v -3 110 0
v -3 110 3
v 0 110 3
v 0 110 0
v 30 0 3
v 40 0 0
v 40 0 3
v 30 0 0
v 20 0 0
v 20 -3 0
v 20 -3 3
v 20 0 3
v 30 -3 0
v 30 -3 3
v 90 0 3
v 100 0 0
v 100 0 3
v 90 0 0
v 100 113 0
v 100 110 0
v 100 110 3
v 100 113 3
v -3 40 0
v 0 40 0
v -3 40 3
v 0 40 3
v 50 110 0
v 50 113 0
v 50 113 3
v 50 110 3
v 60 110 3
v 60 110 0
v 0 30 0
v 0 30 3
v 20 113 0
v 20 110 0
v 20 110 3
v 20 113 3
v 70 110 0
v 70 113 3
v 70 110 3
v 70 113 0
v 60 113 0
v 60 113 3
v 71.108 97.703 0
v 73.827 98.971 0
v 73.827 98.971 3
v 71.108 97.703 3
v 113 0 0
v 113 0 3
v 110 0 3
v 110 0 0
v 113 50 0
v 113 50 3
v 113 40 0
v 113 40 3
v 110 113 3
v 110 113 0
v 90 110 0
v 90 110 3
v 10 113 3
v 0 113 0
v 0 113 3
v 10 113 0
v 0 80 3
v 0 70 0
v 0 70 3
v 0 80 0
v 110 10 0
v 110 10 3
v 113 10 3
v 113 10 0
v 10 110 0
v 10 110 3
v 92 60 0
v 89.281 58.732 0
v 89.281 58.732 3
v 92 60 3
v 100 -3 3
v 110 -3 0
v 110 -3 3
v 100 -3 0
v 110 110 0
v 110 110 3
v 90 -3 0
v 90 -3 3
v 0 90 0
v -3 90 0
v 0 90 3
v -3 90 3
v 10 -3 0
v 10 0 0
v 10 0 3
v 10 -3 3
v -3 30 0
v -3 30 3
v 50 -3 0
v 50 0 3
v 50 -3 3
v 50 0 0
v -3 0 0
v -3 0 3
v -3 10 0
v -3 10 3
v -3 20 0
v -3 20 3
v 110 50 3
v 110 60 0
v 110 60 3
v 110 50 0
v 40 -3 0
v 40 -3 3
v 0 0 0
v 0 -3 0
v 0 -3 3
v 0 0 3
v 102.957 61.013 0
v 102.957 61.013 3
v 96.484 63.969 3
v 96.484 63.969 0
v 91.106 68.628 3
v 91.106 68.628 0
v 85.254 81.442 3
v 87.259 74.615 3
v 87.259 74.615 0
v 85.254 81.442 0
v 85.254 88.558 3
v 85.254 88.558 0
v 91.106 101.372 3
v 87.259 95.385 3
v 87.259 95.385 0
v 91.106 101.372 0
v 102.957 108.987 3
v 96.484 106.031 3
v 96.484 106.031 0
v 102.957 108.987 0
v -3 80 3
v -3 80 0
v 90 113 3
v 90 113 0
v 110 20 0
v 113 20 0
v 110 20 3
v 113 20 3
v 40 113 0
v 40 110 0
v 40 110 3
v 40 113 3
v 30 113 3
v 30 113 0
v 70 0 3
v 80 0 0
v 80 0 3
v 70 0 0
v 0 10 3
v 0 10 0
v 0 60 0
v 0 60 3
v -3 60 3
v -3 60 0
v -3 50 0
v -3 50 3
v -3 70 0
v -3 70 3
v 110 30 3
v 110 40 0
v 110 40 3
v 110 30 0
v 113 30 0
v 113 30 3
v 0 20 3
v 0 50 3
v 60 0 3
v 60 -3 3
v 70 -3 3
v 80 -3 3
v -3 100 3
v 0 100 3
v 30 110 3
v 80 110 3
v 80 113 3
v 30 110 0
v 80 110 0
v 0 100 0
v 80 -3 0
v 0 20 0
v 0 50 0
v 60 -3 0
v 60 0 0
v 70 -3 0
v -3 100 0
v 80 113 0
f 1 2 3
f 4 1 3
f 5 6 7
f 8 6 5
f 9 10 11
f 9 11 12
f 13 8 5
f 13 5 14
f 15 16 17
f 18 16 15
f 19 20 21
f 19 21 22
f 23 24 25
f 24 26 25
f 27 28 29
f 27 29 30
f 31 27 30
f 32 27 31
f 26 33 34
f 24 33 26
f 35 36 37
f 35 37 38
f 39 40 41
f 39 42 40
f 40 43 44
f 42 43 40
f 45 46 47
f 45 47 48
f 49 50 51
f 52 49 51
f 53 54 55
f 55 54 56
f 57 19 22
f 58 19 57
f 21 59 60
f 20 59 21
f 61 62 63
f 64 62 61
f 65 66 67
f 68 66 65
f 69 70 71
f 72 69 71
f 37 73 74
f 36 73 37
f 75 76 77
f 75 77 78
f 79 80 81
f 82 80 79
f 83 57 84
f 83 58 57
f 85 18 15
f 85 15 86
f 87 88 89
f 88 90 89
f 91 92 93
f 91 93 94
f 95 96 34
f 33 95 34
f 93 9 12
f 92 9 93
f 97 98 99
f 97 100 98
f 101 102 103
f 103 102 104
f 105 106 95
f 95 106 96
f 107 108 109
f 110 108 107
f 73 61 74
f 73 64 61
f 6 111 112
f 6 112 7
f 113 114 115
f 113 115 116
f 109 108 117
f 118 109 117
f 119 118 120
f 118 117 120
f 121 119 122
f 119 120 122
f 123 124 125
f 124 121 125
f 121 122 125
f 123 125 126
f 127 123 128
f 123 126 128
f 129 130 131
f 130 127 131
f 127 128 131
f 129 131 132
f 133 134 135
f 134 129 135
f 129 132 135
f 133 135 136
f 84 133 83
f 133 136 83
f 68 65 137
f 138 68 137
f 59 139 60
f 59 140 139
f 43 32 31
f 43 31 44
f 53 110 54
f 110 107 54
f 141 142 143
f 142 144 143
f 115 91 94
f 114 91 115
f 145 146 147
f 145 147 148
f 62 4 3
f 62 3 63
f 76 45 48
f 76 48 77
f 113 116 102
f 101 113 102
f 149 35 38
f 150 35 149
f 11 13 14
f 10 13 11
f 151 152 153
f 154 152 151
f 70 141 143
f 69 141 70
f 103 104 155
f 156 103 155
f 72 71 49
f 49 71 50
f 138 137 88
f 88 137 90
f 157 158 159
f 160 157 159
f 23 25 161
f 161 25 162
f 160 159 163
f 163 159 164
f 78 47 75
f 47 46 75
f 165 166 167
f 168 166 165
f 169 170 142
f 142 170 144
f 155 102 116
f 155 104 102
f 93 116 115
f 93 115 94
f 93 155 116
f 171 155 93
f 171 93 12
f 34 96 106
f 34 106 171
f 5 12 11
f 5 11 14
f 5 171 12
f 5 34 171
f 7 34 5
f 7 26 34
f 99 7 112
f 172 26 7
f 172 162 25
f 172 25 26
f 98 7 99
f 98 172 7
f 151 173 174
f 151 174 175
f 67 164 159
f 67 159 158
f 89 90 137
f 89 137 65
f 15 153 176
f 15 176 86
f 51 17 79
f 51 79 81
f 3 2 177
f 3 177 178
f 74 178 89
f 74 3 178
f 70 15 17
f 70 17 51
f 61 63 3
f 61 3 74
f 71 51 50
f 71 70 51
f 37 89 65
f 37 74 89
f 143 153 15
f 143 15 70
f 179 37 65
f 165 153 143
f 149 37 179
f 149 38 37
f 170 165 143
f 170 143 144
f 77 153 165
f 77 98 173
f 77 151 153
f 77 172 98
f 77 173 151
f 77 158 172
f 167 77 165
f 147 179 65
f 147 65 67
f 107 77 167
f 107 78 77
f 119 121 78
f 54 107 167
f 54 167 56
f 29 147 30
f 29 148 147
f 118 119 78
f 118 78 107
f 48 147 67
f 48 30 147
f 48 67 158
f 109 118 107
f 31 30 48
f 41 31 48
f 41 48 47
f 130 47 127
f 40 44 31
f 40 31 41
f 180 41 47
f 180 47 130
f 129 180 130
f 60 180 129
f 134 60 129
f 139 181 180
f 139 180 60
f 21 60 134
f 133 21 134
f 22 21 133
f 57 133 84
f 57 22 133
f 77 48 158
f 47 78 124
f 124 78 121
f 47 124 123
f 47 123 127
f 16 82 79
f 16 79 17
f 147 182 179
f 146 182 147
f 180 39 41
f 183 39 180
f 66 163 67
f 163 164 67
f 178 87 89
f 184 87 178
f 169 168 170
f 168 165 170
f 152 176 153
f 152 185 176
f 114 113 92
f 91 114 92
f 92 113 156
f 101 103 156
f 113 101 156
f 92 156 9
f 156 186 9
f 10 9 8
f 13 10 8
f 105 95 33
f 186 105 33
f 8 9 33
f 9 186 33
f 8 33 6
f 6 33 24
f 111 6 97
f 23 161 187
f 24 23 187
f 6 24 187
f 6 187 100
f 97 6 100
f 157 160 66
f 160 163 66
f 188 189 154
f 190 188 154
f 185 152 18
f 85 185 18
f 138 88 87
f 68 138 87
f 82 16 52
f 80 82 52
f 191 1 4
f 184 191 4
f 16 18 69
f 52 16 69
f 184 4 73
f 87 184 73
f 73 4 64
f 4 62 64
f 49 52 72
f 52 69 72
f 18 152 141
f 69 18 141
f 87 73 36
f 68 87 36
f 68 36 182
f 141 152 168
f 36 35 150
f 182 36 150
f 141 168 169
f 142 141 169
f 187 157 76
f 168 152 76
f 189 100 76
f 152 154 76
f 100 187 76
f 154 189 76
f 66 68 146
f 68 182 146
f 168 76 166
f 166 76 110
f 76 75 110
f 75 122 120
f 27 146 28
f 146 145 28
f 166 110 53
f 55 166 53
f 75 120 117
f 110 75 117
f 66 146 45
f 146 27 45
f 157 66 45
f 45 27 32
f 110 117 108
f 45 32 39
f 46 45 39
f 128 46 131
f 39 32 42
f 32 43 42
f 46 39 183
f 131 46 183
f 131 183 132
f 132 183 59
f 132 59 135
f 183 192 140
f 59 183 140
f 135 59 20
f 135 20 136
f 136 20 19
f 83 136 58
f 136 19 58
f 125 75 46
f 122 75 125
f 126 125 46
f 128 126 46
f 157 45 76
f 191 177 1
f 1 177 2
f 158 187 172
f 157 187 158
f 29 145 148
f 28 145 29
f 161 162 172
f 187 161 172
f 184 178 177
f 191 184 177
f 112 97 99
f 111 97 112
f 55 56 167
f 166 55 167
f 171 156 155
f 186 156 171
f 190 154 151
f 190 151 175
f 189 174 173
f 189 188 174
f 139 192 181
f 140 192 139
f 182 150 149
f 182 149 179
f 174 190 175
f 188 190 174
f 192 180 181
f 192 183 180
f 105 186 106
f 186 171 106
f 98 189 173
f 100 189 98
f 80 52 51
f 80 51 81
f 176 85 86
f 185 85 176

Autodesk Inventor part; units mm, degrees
ref_plane "YZ Plane" through (0, 0, 0) normal (1, 0, 0) x (0, 1, 0)
ref_plane "XZ Plane" through (0, 0, 0) normal (0, 1, 0) x (-1, 0, 0)
ref_plane "XY Plane" through (0, 0, 0) normal (0, 0, 1) x (1, 0, 0)
sketch "Sketch1" plane through (0, 0, 0) normal (0, 0, 1) x (1, 0, 0)
  line L0 (0, 110) -> (110, 110)
  line L1 (110, 60) -> (110, 0)
  line L2 (110, 0) -> (0, 0)
  line L3 (0, 0) -> (0, 110)
  arc A0 (110, 110) -> (110, 60) centre (110, 85) ccw
  line L4 (73.8274, 98.9712) -> (73.8274, 60) construction
  line L5 (73.8274, 60) -> (92, 60) construction
  line L6 (73.8274, 98.9712) -> (92, 60)
  line L7 (92, 60) -> (73.8274, 98.9712) construction
  line L8 (73.8274, 98.9712) -> (71.1085, 97.7034)
  line L9 (71.1085, 97.7034) -> (89.2811, 58.7321)
  line L10 (89.2811, 58.7321) -> (92, 60)
  line L11 (0, 0) -> (10, 0)
  line L12 (10, 0) -> (10, -3)
  line L13 (10, -3) -> (0, -3)
  line L14 (0, -3) -> (0, 0)
  line L15 (30, 0) -> (30, -3)
  line L16 (20, 0) -> (30, 0)
  line L17 (20, -3) -> (20, 0)
  line L18 (30, -3) -> (20, -3)
  line L19 (50, 0) -> (50, -3)
  line L20 (40, 0) -> (50, 0)
  line L21 (40, -3) -> (40, 0)
  line L22 (50, -3) -> (40, -3)
  line L23 (70, 0) -> (70, -3)
  line L24 (60, 0) -> (70, 0)
  line L25 (60, -3) -> (60, 0)
  line L26 (70, -3) -> (60, -3)
  line L27 (90, 0) -> (90, -3)
  line L28 (80, 0) -> (90, 0)
  line L29 (80, -3) -> (80, 0)
  line L30 (90, -3) -> (80, -3)
  line L31 (110, 0) -> (110, -3)
  line L32 (100, 0) -> (110, 0)
  line L33 (100, -3) -> (100, 0)
  line L34 (110, -3) -> (100, -3)
  line L35 (10, 113) -> (10, 110)
  line L36 (0, 113) -> (10, 113)
  line L37 (0, 110) -> (0, 113)
  line L38 (10, 110) -> (0, 110)
  line L39 (30, 113) -> (30, 110)
  line L40 (20, 113) -> (30, 113)
  line L41 (20, 110) -> (20, 113)
  line L42 (30, 110) -> (20, 110)
  line L43 (50, 113) -> (50, 110)
  line L44 (40, 113) -> (50, 113)
  line L45 (40, 110) -> (40, 113)
  line L46 (50, 110) -> (40, 110)
  line L47 (70, 113) -> (70, 110)
  line L48 (60, 113) -> (70, 113)
  line L49 (60, 110) -> (60, 113)
  line L50 (70, 110) -> (60, 110)
  line L51 (90, 113) -> (90, 110)
  line L52 (80, 113) -> (90, 113)
  line L53 (80, 110) -> (80, 113)
  line L54 (90, 110) -> (80, 110)
  line L55 (110, 113) -> (110, 110)
  line L56 (100, 113) -> (110, 113)
  line L57 (100, 110) -> (100, 113)
  line L58 (110, 110) -> (100, 110)
  point P0 (0, 0)
  dimension "d1" = 110
  dimension "d2" = 110
  dimension "d3" = 110
  dimension "d4" = 25
  dimension "d6" = 18.1726
  dimension "d7" = 38.9712
  dimension "d8" = 18
  dimension "d9" = 3
  dimension "d12" = 3
  dimension "d13" = 10
  dimension "d16" = 20
  dimension "d19" = 113
extrude "Extrusion1" add sketch "Sketch1" along normal blind 3
sketch "Sketch2" plane through (0, 0, 3) normal (0, 0, 1) x (1, 0, 0)
  line L0 (0, 0) -> (-3, 0)
  line L1 (-3, 0) -> (-3, 10)
  line L2 (-3, 10) -> (0, 10)
  line L3 (0, 10) -> (0, 0)
  line L4 (0, 113) -> (0, -3) construction
  line L5 (90, 0) -> (100, 0) construction
  line L6 (0, 20) -> (-3, 20)
  line L7 (-3, 20) -> (-3, 30)
  line L8 (-3, 30) -> (0, 30)
  line L9 (0, 30) -> (0, 20)
  line L10 (0, 40) -> (-3, 40)
  line L11 (-3, 40) -> (-3, 50)
  line L12 (-3, 50) -> (0, 50)
  line L13 (0, 50) -> (0, 40)
  line L14 (0, 60) -> (-3, 60)
  line L15 (-3, 60) -> (-3, 70)
  line L16 (-3, 70) -> (0, 70)
  line L17 (0, 70) -> (0, 60)
  line L18 (0, 80) -> (-3, 80)
  line L19 (-3, 80) -> (-3, 90)
  line L20 (-3, 90) -> (0, 90)
  line L21 (0, 90) -> (0, 80)
  line L22 (0, 100) -> (-3, 100)
  line L23 (-3, 100) -> (-3, 110)
  line L24 (-3, 110) -> (0, 110)
  line L25 (0, 110) -> (0, 100)
  line L26 (113, 10) -> (113, 0)
  line L27 (113, 0) -> (110, 0)
  line L28 (110, 0) -> (110, 10)
  line L29 (110, 10) -> (113, 10)
  line L30 (0, 30) -> (0, 20)
  line L31 (0, 20) -> (-3, 20)
  line L32 (-3, 20) -> (-3, 30)
  line L33 (-3, 30) -> (0, 30)
  line L34 (113, 30) -> (113, 20)
  line L35 (113, 20) -> (110, 20)
  line L36 (110, 20) -> (110, 30)
  line L37 (110, 30) -> (113, 30)
  line L38 (0, 50) -> (0, 40)
  line L39 (0, 40) -> (-3, 40)
  line L40 (-3, 40) -> (-3, 50)
  line L41 (-3, 50) -> (0, 50)
  line L42 (113, 50) -> (113, 40)
  line L43 (113, 40) -> (110, 40)
  line L44 (110, 40) -> (110, 50)
  line L45 (110, 50) -> (113, 50)
  dimension "d22" = 3
  dimension "d23" = 10
  dimension "d26" = 20
  dimension "d33" = 113
  dimension "d36" = 20
extrude "Extrusion2" add sketch "Sketch2" against normal blind 3
properties part number "ParedPantalla"
